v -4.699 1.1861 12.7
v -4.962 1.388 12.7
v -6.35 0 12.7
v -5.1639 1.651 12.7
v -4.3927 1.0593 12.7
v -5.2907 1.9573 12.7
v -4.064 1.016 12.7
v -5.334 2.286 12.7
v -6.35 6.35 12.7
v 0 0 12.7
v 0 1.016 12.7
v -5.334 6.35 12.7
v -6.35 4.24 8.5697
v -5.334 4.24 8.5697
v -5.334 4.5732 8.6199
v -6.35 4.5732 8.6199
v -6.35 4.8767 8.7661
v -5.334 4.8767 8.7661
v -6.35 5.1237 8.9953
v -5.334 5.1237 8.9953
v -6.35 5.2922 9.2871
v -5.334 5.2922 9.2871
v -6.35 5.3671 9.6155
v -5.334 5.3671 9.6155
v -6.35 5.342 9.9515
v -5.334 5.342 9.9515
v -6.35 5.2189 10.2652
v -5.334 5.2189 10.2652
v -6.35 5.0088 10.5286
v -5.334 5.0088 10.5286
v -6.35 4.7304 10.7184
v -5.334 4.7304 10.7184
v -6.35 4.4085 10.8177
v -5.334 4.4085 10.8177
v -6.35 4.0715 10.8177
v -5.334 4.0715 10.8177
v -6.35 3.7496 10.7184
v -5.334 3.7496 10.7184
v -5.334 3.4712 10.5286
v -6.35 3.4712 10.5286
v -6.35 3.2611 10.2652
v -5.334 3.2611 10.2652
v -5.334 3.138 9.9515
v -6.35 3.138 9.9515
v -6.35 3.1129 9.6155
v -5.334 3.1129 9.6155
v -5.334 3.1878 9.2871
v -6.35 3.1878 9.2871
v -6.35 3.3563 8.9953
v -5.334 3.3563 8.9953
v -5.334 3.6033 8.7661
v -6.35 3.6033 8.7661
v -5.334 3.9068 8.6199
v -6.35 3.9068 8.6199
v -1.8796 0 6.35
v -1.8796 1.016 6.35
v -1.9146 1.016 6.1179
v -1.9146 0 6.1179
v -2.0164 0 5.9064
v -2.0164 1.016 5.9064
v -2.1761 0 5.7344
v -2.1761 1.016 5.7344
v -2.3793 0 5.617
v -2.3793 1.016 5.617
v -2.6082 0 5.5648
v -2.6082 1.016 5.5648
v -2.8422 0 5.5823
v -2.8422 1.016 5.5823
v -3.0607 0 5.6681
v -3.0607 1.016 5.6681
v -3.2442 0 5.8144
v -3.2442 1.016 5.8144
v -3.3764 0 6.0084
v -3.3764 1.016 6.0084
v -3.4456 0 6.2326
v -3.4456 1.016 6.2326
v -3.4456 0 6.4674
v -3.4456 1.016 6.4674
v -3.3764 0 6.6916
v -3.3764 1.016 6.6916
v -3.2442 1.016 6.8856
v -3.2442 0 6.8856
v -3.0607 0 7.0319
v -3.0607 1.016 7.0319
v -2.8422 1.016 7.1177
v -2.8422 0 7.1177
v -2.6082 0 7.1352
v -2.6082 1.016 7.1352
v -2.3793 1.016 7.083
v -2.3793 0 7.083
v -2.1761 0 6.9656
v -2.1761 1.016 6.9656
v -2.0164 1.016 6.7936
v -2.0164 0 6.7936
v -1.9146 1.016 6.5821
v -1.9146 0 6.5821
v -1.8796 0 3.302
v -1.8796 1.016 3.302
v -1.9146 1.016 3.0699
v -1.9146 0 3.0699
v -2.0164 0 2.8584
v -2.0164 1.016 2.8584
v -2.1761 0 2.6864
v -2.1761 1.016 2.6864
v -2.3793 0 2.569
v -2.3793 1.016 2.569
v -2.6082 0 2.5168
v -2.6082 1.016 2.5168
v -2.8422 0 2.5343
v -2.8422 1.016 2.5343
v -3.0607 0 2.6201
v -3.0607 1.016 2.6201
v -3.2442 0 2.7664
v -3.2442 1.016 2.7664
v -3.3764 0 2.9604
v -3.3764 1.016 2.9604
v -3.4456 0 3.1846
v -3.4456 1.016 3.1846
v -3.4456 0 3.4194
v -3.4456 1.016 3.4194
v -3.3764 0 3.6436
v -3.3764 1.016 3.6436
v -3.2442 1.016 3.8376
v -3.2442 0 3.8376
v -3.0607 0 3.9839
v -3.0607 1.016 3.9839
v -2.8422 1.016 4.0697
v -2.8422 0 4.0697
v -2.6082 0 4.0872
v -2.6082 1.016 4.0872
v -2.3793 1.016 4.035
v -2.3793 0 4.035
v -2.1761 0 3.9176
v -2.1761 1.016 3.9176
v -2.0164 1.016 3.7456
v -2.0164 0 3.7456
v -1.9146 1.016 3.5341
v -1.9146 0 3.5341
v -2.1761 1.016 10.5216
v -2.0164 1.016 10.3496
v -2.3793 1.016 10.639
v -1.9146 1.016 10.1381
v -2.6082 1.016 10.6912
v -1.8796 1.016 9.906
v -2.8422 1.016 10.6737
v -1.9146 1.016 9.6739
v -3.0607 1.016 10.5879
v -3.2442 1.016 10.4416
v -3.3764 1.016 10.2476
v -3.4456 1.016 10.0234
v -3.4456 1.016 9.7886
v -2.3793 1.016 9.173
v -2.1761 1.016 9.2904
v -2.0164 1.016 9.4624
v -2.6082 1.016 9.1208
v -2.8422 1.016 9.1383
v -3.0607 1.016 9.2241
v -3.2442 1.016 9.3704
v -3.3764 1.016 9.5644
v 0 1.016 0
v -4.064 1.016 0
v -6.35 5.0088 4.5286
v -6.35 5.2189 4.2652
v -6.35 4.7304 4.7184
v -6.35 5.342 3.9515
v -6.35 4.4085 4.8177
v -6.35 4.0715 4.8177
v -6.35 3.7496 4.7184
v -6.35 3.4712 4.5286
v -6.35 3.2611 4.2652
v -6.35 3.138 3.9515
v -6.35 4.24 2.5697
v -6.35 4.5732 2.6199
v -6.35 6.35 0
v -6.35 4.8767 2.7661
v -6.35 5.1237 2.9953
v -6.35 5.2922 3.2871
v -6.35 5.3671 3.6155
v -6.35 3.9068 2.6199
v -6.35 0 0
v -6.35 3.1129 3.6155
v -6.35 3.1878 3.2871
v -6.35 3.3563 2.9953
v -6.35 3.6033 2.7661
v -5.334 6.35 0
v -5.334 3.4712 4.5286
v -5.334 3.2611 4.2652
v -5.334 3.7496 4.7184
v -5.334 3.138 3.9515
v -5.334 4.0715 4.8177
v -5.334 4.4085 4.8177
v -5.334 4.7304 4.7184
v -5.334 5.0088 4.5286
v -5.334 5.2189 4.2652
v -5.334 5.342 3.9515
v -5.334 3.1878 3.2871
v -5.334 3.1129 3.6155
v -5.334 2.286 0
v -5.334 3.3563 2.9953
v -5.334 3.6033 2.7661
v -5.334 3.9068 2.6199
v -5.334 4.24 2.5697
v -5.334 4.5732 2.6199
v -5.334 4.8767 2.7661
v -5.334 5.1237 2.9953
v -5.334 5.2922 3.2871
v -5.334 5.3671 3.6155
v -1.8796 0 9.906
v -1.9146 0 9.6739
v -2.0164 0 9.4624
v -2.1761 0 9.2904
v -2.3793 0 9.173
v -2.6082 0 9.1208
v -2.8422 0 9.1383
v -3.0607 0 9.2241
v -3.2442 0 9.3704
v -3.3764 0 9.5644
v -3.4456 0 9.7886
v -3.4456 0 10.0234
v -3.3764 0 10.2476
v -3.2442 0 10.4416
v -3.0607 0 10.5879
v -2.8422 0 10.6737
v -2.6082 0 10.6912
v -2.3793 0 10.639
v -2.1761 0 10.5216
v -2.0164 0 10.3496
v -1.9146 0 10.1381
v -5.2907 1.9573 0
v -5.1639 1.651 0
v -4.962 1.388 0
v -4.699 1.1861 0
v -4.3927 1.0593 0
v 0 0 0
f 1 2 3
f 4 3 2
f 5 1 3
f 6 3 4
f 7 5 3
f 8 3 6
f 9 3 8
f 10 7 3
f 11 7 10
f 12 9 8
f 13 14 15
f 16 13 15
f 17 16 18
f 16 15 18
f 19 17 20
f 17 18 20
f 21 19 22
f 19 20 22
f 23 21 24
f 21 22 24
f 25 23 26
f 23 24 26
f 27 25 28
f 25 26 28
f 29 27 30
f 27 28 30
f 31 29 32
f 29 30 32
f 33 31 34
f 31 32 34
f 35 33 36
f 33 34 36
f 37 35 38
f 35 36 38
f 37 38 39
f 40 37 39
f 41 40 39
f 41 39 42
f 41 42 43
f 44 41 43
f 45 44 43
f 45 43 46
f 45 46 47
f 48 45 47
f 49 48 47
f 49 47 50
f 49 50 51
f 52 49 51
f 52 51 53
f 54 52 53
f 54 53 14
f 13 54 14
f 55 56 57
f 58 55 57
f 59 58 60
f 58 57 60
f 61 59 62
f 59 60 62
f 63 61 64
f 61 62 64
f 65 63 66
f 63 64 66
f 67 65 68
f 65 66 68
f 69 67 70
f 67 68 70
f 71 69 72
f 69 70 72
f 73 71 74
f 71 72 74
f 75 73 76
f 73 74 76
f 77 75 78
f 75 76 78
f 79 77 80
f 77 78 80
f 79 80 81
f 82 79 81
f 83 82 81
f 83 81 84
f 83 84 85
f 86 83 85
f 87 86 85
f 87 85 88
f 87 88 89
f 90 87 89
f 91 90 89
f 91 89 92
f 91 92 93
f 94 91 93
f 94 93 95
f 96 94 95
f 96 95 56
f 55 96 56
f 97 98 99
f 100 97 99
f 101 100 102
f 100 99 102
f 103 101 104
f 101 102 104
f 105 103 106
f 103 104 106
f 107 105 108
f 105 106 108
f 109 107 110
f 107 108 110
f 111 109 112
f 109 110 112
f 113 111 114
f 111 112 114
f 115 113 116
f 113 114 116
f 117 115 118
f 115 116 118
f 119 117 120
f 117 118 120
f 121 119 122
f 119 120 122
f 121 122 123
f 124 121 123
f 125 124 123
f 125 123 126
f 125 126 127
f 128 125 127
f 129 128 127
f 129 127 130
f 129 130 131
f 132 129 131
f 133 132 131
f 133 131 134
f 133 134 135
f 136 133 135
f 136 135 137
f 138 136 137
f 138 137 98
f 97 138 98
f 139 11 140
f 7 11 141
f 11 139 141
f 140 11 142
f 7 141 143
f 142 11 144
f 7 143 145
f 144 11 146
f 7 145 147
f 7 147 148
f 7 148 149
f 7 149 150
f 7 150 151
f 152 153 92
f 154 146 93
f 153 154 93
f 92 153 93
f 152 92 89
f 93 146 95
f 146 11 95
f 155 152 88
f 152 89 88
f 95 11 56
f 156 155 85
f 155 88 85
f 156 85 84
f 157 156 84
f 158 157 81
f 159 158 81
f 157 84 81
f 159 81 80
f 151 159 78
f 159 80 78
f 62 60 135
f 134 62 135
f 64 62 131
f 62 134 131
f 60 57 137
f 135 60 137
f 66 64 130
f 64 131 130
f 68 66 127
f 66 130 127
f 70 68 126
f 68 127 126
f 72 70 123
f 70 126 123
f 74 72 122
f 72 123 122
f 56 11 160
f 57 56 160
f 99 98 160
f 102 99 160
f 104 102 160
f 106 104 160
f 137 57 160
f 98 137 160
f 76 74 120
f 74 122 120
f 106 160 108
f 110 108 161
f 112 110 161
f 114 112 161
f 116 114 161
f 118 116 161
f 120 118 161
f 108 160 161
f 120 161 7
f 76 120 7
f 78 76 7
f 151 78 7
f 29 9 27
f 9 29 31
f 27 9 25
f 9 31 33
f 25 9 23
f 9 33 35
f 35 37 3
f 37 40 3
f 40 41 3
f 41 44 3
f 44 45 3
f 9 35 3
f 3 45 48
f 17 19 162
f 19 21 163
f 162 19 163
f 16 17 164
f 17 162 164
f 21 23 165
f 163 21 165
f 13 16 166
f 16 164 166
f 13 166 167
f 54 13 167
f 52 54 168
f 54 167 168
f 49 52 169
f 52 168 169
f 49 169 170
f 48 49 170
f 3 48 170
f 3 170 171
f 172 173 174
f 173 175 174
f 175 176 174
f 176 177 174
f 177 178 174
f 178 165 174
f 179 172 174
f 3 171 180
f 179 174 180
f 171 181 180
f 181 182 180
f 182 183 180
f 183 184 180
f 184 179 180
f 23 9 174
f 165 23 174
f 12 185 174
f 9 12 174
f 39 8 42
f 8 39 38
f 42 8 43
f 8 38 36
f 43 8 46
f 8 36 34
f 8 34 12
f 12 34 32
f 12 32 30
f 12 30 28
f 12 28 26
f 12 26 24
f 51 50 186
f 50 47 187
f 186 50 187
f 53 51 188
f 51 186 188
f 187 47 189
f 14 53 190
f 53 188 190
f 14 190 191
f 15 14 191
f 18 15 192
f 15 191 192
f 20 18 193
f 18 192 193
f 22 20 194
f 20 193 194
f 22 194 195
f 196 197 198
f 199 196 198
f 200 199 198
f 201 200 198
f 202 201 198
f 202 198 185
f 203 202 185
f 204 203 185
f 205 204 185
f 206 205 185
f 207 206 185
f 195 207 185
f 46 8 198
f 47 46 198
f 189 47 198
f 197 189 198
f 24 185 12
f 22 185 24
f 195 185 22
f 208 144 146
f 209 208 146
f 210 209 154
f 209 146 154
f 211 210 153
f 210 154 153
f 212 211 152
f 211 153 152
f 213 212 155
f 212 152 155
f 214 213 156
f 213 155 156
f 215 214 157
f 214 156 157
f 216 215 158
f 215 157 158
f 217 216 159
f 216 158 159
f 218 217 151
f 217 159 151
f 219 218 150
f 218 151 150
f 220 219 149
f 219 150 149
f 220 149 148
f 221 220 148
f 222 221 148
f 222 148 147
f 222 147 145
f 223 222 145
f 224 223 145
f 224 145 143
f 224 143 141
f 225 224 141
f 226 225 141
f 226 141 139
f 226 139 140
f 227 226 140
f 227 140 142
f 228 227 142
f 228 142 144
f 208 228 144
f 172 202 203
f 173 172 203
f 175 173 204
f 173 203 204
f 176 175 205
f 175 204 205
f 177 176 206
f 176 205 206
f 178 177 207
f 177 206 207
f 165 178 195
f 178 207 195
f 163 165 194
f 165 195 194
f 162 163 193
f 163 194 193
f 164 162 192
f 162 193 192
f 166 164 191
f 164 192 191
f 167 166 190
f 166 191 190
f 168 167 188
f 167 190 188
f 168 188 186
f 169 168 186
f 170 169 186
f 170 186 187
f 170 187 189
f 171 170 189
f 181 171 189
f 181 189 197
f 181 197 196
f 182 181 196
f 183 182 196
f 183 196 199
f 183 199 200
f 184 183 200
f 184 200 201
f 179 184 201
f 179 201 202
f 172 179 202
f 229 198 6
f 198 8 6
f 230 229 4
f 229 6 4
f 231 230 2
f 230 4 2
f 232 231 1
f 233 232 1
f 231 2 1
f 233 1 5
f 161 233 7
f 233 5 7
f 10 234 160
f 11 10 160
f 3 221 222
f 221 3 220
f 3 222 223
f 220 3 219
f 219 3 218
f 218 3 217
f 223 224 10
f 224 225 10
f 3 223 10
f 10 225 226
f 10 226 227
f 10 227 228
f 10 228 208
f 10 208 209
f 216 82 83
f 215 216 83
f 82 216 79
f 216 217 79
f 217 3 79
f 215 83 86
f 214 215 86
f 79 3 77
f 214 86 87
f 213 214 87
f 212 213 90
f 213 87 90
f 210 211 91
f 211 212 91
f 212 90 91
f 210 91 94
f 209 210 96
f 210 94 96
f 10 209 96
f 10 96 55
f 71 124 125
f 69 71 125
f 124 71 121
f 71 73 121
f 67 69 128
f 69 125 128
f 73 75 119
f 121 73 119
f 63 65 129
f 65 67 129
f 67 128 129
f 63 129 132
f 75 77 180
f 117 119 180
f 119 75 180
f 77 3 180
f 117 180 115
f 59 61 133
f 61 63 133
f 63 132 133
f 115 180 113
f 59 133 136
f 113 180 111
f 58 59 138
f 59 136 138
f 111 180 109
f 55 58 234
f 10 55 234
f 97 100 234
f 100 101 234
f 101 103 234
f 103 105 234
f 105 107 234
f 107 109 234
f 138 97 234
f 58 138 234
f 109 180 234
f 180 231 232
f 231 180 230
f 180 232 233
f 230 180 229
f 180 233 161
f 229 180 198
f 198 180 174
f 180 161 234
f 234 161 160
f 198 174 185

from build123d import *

# Parameters (mm, degrees)
BOSS_EXTRUDE1_DEPTH = 12.7
SKETCH3_R           = 0.7874
CUT_EXTRUDE1_DEPTH  = 2.54
FILLET1_R           = 1.27
CUT_EXTRUDE2_REACH  = 3.016
SKETCH4_R           = 1.1303


with BuildPart() as part:
    # Sketch1 → Boss-Extrude1 (new body)
    with BuildSketch(Plane.XY):
        Polygon((-6.35, 6.35), (-6.35, 0), (0, 0), (0, 1.016), (-5.334, 1.016), (-5.334, 6.35), align=None)
    extrude(amount=BOSS_EXTRUDE1_DEPTH)

    # Sketch3 → Cut-Extrude1 (cut)
    with BuildSketch(Plane(origin=(0, 1.016, 0), x_dir=(1, 0, 0), z_dir=(0, 1, 0))):
        with Locations((-2.667, -9.906)):
            Circle(SKETCH3_R)
        with Locations((-2.667, -6.35)):
            Circle(SKETCH3_R)
        with Locations((-2.667, -3.302)):
            Circle(SKETCH3_R)
    extrude(amount=-CUT_EXTRUDE1_DEPTH, mode=Mode.SUBTRACT)

    # Fillet1
    fillet1_edges = [part.edges().sort_by_distance(p)[0] for p in [
        (-5.334, 1.016, 6.35),
    ]]
    fillet(fillet1_edges, radius=FILLET1_R)

    # Sketch4 → Cut-Extrude2 (cut, up to next)
    with BuildSketch(Plane(origin=(-5.334, 0, 0), x_dir=(0, 0, -1), z_dir=(1, 0, 0)), mode=Mode.PRIVATE) as cut_extrude2_sk1:
        with Locations((-9.7, 4.24)):
            Circle(SKETCH4_R)
    cut_extrude2_tool1 = extrude(cut_extrude2_sk1.sketch, amount=-CUT_EXTRUDE2_REACH, mode=Mode.PRIVATE) & part.part
    add(cut_extrude2_tool1.solids().sort_by_distance((-5.334, 4.24, 9.7))[0], mode=Mode.SUBTRACT)
    # Sketch4 → Cut-Extrude2 (cut, up to next)
    with BuildSketch(Plane(origin=(-5.334, 0, 0), x_dir=(0, 0, -1), z_dir=(1, 0, 0)), mode=Mode.PRIVATE) as cut_extrude2_sk2:
        with Locations((-3.7, 4.24)):
            Circle(SKETCH4_R)
    cut_extrude2_tool2 = extrude(cut_extrude2_sk2.sketch, amount=-CUT_EXTRUDE2_REACH, mode=Mode.PRIVATE) & part.part
    add(cut_extrude2_tool2.solids().sort_by_distance((-5.334, 4.24, 3.7))[0], mode=Mode.SUBTRACT)


solid = part.part
